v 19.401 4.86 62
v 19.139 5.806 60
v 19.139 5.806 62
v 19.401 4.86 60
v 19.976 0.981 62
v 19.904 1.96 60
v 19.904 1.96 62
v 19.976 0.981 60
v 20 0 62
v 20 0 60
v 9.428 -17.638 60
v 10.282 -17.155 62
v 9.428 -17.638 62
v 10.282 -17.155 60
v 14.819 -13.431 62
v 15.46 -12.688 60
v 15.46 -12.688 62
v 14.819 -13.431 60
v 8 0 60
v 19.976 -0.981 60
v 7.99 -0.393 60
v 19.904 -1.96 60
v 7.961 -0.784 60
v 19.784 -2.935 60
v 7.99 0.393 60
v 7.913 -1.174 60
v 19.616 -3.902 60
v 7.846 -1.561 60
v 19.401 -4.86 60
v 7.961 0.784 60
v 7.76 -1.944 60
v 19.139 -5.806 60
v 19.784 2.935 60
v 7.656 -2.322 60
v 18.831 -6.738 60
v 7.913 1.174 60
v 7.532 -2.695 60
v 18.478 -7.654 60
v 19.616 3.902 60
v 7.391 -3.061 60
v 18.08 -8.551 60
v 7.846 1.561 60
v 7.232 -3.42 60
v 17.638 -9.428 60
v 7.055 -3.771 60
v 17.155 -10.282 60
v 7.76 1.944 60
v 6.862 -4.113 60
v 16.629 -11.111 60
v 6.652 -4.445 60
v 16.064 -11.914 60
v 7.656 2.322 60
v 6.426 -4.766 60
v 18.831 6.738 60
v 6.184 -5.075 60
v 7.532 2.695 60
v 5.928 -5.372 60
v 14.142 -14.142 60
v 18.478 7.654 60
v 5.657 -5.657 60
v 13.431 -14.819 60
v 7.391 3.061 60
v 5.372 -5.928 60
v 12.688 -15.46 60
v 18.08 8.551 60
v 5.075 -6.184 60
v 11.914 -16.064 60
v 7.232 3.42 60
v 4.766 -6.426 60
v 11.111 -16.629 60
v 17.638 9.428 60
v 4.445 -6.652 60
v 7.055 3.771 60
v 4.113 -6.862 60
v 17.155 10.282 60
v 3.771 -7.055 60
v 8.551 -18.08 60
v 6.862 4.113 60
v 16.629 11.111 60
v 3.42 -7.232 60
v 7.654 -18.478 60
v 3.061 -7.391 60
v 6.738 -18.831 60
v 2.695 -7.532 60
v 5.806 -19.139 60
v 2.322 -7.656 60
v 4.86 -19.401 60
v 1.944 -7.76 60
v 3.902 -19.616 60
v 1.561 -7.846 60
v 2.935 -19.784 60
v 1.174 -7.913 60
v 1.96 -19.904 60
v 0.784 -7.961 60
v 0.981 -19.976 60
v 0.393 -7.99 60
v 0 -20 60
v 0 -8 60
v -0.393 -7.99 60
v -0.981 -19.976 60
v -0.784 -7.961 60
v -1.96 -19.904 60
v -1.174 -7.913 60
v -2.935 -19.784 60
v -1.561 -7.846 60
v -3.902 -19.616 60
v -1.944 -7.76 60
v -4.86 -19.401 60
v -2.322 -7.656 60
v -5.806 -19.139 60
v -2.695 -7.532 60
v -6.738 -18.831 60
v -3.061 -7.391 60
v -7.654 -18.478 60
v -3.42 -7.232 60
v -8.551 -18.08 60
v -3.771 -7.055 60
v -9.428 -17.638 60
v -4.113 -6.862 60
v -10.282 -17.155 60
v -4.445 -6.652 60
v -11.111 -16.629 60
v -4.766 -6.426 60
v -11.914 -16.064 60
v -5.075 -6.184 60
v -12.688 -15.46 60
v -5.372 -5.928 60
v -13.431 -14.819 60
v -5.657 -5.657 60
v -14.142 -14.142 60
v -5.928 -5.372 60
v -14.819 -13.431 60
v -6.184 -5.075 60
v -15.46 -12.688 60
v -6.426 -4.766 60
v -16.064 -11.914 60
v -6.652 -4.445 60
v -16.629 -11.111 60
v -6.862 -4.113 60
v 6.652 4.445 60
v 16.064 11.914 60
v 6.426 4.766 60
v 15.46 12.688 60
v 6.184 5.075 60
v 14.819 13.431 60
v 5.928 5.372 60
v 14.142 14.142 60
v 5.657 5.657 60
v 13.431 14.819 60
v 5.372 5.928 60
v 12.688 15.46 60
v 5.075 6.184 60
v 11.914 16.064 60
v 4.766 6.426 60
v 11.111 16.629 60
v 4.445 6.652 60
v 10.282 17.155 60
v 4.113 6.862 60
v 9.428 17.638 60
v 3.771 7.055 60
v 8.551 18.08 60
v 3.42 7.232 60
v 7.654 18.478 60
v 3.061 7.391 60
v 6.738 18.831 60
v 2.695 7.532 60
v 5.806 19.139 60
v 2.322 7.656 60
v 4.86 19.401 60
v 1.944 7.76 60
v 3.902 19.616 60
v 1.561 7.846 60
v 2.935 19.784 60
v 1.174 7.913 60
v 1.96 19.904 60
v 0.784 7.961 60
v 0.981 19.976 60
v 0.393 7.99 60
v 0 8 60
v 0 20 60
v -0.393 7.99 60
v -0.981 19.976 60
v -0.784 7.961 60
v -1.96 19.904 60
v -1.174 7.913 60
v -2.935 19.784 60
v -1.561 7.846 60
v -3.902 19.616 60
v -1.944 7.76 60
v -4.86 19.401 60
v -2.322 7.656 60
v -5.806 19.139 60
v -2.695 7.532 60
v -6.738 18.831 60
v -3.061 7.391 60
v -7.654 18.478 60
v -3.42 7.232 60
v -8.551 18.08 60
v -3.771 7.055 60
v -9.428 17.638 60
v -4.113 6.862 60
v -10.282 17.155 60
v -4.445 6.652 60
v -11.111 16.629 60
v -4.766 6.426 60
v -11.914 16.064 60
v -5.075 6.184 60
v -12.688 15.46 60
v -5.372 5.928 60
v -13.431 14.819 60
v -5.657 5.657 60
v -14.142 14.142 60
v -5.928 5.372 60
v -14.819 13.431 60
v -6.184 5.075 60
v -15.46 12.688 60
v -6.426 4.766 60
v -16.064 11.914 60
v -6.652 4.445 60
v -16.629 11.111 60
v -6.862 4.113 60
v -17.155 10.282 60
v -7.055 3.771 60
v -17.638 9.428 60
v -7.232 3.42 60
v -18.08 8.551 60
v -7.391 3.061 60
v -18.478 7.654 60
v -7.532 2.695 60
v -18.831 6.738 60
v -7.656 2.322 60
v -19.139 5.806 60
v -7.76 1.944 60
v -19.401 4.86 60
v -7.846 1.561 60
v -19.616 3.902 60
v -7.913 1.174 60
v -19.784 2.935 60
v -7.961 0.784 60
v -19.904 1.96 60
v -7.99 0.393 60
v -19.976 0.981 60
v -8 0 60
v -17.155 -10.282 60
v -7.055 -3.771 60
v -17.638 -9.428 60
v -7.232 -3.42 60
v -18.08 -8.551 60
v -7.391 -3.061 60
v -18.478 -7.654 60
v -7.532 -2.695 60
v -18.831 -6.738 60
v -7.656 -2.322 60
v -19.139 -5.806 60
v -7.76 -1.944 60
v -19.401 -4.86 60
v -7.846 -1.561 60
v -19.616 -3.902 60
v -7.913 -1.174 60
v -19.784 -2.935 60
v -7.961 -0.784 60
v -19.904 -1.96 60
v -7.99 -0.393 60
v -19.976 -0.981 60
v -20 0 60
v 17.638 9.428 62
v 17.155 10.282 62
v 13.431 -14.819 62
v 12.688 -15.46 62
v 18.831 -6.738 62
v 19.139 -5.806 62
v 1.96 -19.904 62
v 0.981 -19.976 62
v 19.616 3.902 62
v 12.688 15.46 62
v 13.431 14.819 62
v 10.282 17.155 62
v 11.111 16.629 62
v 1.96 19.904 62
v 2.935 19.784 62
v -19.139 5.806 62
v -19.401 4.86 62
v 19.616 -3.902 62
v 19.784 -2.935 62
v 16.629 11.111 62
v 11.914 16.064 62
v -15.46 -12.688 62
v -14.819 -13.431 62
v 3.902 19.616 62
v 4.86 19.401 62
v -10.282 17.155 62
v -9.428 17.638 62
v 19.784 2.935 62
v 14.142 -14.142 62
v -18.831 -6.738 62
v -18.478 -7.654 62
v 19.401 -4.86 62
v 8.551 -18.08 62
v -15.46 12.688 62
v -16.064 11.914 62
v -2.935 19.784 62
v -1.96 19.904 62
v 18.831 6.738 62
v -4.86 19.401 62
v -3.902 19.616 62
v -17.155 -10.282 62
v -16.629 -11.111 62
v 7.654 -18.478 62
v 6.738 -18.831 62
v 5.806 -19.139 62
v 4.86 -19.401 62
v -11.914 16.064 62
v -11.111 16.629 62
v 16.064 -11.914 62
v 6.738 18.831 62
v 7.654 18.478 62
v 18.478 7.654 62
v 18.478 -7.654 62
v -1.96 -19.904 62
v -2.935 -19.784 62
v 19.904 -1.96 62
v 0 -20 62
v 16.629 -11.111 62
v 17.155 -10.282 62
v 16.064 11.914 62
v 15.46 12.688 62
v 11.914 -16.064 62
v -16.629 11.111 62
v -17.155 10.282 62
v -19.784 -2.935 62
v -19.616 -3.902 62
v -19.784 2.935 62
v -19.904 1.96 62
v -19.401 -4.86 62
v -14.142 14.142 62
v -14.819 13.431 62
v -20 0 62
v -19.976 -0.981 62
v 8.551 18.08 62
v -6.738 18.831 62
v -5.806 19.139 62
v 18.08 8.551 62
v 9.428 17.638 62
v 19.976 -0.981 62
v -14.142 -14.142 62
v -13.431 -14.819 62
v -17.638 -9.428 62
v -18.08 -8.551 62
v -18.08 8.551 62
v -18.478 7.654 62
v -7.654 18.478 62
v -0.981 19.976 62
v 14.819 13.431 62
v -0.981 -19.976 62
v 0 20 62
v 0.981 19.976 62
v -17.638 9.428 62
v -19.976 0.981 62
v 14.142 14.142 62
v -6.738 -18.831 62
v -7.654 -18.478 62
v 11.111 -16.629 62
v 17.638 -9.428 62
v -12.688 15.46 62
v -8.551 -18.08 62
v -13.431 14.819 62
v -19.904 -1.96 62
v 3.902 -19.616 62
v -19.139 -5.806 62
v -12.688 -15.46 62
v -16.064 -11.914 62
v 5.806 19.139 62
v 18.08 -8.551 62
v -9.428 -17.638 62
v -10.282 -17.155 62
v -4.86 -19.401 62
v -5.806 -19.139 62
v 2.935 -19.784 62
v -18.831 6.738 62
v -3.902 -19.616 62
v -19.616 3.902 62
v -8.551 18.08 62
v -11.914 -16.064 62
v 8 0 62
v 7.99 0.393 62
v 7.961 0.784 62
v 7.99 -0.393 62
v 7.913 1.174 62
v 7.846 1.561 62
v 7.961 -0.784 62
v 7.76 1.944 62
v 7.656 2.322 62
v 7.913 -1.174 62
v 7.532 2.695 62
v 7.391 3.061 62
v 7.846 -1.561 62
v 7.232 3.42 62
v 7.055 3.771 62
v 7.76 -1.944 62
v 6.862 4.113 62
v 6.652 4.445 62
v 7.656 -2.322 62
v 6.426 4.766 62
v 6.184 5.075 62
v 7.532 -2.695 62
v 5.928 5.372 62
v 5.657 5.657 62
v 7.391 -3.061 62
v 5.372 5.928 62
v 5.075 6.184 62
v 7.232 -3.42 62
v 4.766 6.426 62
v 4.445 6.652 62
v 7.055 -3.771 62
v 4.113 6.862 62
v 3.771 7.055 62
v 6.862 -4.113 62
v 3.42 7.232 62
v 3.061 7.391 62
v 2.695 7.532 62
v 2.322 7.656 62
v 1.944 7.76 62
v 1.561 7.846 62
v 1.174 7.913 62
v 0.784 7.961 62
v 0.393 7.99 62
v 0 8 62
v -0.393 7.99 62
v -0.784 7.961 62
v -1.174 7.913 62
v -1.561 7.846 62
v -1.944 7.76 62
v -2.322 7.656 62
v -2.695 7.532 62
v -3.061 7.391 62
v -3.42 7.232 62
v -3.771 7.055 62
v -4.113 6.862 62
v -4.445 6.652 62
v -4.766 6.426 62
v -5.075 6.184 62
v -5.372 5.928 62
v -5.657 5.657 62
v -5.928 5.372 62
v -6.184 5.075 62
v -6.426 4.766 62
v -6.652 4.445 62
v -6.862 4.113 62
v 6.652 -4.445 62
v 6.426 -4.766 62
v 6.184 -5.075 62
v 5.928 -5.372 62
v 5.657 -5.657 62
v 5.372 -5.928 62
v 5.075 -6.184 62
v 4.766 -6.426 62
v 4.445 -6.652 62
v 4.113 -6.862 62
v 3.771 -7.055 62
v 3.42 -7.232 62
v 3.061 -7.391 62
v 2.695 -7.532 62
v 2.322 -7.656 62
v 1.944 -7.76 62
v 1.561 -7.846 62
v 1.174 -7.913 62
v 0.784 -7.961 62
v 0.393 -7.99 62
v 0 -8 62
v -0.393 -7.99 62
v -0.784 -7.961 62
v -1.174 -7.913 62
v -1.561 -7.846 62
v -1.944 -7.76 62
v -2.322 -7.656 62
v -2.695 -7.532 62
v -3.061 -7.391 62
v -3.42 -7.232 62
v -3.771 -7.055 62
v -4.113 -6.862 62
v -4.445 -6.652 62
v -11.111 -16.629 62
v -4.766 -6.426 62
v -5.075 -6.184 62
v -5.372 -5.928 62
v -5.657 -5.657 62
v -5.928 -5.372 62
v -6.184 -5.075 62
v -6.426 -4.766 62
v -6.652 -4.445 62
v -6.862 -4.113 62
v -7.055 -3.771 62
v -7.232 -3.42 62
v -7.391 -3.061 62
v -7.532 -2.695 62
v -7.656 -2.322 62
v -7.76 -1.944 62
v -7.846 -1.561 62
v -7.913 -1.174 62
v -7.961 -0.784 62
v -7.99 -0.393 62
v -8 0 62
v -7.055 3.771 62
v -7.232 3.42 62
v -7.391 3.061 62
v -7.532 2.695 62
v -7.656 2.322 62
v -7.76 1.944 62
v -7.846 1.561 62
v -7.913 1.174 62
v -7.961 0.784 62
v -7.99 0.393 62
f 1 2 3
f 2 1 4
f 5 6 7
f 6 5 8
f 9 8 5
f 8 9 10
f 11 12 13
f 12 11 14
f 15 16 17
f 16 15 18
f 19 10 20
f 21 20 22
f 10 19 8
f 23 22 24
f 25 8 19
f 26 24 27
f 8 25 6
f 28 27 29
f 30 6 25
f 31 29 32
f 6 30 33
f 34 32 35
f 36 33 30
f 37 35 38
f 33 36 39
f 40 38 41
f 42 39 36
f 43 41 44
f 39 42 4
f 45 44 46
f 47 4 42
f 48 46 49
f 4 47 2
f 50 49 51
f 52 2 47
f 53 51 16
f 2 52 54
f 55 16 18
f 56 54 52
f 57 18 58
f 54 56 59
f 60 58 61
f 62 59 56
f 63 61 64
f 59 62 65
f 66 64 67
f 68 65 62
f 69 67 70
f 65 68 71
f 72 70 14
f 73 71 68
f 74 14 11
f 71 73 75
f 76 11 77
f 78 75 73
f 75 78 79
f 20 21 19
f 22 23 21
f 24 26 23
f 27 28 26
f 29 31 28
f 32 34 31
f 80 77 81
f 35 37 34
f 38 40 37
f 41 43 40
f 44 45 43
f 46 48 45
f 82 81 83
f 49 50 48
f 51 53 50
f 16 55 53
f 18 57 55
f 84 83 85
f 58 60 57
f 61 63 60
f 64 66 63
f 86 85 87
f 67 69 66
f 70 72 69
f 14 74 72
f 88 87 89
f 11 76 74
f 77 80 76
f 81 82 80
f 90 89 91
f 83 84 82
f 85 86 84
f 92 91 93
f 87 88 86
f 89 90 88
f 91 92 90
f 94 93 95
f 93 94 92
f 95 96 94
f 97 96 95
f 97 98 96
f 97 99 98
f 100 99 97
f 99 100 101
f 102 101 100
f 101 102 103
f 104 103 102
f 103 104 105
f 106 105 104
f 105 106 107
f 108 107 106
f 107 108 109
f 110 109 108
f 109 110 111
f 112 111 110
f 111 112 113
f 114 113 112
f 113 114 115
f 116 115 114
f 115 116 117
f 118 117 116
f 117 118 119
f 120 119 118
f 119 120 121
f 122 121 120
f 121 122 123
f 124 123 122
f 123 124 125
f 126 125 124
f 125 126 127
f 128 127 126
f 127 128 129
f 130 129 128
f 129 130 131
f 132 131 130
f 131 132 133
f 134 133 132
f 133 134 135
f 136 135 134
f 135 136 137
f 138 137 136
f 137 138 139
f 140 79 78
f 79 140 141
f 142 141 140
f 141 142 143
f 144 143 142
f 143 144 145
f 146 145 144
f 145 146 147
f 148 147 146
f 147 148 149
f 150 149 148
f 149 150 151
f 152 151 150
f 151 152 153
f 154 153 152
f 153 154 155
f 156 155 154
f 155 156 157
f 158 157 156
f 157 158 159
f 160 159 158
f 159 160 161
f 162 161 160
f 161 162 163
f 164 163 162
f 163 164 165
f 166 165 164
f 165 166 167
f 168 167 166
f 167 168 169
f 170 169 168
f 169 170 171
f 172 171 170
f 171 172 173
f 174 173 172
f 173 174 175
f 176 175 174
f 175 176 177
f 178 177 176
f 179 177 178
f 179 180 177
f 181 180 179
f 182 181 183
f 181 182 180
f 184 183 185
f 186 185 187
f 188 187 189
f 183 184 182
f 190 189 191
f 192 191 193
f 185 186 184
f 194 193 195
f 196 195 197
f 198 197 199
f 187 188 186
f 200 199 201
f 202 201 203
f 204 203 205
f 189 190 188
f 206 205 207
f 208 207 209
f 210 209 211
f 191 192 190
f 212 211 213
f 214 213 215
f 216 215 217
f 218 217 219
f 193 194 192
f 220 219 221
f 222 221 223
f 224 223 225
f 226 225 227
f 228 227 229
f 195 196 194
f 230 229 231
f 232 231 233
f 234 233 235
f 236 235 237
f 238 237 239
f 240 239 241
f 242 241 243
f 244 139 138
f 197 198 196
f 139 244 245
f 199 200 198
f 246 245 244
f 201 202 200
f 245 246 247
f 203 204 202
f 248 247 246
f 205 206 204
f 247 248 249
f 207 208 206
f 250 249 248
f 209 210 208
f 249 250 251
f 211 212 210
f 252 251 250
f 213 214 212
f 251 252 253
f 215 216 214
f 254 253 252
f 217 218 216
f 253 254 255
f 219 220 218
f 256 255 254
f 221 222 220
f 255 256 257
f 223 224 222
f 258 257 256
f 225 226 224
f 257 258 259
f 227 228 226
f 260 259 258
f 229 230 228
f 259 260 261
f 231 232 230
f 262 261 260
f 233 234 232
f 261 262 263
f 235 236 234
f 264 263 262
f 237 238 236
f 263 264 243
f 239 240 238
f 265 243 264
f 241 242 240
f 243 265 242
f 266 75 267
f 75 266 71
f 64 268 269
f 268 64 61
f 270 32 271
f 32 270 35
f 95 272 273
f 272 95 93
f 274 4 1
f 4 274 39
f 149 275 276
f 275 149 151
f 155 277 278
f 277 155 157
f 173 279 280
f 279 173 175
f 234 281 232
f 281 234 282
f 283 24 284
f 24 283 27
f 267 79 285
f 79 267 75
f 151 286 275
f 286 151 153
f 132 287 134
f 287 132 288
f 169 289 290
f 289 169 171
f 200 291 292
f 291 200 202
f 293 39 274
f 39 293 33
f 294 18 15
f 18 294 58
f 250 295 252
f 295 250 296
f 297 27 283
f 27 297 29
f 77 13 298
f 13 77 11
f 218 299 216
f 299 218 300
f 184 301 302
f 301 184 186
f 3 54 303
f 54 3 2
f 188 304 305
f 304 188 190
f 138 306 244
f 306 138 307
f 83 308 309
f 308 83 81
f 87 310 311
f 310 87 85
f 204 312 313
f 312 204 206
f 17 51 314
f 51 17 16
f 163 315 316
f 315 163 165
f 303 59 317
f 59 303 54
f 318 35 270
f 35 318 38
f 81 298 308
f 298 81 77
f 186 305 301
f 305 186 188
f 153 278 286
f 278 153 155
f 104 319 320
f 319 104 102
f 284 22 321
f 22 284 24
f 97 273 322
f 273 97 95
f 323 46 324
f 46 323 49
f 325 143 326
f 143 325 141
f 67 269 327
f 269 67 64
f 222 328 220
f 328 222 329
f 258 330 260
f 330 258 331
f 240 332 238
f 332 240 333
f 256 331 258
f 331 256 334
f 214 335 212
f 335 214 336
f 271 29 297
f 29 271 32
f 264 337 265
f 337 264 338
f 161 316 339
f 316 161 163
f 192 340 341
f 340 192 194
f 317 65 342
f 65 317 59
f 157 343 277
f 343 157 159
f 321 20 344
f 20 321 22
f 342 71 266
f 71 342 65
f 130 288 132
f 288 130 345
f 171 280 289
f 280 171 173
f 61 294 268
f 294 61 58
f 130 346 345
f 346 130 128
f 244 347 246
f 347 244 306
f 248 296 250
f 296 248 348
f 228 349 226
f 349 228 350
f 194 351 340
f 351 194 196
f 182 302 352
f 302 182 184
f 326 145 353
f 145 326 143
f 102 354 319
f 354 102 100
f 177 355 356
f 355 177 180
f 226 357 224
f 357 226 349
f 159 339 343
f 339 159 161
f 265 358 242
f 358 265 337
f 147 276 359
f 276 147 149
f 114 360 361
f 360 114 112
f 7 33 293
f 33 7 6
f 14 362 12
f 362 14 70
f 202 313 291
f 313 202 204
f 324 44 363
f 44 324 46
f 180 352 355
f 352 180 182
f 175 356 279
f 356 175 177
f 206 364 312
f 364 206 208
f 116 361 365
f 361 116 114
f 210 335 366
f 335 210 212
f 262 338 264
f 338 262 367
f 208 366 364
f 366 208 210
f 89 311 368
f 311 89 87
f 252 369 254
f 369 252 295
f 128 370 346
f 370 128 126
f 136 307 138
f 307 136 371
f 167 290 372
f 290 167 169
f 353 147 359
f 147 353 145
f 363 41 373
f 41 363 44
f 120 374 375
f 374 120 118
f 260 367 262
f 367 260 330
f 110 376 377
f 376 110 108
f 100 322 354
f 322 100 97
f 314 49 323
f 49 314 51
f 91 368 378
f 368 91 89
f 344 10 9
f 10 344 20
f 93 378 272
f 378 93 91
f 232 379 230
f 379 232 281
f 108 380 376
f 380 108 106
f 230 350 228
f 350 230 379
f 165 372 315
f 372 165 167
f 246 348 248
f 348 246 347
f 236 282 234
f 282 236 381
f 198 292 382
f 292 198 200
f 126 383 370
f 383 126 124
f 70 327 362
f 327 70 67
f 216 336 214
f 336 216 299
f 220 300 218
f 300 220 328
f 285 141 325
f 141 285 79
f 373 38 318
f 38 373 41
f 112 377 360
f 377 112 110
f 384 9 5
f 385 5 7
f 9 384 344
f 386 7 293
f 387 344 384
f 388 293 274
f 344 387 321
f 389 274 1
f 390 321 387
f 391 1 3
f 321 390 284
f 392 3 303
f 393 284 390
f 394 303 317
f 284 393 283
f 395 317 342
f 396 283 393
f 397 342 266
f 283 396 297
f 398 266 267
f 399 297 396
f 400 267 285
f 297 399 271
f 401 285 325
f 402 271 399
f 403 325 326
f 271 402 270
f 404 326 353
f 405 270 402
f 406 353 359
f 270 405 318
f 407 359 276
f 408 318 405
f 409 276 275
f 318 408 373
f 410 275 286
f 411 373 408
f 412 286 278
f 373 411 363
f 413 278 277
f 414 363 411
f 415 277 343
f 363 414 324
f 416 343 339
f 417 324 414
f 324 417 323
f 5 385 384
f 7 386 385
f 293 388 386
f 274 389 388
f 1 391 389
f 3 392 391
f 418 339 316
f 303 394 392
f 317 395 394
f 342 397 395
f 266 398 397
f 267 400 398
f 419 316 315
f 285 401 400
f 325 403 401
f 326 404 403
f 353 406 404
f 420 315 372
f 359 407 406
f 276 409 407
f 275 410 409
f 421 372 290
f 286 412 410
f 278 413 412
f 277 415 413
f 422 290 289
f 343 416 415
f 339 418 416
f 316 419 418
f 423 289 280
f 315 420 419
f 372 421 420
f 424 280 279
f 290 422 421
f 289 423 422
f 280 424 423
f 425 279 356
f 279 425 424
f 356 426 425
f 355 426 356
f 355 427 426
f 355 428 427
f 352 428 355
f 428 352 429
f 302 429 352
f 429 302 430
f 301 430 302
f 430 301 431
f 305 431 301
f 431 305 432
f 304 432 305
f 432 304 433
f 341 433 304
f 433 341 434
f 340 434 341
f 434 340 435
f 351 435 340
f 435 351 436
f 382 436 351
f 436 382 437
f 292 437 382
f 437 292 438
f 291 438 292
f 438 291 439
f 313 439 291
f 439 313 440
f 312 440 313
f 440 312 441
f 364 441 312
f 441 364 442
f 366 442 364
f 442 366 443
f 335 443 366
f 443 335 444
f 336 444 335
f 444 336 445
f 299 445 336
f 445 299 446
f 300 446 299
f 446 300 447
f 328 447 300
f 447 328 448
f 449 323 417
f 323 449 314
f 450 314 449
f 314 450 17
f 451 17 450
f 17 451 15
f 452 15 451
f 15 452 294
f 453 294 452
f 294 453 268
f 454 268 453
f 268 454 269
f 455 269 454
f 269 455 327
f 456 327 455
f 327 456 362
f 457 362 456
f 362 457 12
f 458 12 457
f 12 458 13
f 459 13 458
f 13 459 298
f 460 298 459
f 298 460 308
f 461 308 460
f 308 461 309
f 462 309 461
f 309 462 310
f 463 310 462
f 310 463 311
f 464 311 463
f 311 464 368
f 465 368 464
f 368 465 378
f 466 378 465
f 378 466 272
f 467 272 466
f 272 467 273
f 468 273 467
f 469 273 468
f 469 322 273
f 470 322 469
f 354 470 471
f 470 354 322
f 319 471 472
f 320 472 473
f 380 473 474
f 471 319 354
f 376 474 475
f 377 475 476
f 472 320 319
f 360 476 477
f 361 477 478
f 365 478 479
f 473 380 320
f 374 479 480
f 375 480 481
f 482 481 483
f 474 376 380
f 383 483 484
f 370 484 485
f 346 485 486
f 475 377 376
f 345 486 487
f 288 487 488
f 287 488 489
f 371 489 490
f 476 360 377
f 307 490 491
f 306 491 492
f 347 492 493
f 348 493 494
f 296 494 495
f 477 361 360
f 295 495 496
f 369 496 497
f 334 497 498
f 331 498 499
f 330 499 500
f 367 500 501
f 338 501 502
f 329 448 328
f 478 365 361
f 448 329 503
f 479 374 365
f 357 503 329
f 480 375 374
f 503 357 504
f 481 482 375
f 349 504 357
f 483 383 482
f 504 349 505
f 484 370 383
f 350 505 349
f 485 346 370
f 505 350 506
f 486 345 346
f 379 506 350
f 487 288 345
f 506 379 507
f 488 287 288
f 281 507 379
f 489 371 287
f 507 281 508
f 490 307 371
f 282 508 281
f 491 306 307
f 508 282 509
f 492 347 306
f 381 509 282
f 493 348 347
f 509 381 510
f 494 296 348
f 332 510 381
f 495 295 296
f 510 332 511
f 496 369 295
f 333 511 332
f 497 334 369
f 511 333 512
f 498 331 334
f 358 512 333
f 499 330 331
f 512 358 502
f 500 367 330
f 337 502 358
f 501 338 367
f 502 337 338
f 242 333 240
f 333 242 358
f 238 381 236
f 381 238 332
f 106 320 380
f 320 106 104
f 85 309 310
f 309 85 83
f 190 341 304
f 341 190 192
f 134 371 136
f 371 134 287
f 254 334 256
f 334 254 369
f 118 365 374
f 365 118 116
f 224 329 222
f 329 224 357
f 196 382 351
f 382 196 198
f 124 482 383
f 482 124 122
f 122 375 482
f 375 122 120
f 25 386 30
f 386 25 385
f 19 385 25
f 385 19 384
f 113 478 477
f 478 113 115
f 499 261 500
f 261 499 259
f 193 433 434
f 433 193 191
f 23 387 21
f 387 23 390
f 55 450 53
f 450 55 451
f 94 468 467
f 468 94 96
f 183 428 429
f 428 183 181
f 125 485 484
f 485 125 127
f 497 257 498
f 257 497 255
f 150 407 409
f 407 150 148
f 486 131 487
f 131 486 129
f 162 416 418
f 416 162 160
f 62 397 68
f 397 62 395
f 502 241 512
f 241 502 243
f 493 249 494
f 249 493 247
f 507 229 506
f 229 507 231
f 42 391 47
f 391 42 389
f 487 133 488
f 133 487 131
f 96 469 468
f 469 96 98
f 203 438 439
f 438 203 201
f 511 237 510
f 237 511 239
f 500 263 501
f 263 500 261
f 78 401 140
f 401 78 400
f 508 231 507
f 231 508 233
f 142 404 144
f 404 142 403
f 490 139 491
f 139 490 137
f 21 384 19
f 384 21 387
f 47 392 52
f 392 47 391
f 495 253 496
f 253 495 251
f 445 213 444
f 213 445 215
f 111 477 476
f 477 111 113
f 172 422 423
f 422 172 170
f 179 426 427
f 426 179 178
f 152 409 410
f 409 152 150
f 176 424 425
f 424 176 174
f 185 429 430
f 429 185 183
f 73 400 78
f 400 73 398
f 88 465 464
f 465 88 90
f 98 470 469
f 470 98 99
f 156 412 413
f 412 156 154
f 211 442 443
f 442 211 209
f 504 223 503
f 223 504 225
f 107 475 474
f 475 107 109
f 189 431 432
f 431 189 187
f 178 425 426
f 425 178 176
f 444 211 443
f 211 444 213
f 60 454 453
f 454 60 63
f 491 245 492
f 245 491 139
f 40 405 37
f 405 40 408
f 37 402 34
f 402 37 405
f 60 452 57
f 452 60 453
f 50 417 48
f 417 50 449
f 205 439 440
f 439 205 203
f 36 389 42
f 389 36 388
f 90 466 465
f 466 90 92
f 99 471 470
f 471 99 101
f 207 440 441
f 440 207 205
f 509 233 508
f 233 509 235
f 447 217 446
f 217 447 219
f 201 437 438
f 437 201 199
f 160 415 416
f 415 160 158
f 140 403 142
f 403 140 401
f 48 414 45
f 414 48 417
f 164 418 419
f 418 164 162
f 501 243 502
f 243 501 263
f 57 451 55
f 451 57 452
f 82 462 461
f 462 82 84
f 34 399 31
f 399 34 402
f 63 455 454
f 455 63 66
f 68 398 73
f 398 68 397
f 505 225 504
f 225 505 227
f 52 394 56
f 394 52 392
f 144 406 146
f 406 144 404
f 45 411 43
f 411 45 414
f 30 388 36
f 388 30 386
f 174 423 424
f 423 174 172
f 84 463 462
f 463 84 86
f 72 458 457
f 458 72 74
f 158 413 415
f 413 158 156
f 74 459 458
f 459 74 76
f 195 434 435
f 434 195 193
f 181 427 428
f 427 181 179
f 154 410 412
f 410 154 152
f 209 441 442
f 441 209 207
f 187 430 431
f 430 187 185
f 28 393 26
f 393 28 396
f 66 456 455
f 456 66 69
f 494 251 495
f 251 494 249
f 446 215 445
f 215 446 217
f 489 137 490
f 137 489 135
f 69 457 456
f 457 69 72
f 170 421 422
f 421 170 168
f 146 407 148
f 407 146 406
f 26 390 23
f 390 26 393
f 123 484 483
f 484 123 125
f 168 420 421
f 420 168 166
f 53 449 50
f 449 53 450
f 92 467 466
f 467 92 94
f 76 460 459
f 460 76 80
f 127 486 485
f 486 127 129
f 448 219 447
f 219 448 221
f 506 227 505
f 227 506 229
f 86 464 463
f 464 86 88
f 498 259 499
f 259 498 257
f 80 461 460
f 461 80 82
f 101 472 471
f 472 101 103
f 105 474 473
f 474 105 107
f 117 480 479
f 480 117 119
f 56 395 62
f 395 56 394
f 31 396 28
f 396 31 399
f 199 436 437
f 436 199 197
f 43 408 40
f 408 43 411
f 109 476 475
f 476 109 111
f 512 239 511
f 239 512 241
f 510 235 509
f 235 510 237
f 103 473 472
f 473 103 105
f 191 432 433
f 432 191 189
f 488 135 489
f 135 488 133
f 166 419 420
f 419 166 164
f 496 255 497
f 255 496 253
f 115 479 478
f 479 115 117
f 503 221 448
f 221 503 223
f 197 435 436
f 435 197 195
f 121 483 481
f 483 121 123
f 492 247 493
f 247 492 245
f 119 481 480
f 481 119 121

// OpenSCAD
// file: common_params.scad
cylinder_radius = 20.000000;
cylinder_height = 60.000000;
wall_thickness = 2.000000;

cap_thickness = 2.000000;

rod_radius = 2.000000;
rod_height = 50.000000;

ring_outer_radius = 8.000000;
ring_inner_radius = 4.000000;
ring_thickness = 3.000000;
ring_z = 40.000000;

$fn = 128;
// main file
include <common_params.scad>;

hole_radius = 8.000000;

translate([0, 0, cylinder_height])
difference() {
    cylinder(h = cap_thickness, r = cylinder_radius);
    translate([0, 0, -0.1])
        cylinder(h = cap_thickness + 0.2, r = hole_radius);
}
